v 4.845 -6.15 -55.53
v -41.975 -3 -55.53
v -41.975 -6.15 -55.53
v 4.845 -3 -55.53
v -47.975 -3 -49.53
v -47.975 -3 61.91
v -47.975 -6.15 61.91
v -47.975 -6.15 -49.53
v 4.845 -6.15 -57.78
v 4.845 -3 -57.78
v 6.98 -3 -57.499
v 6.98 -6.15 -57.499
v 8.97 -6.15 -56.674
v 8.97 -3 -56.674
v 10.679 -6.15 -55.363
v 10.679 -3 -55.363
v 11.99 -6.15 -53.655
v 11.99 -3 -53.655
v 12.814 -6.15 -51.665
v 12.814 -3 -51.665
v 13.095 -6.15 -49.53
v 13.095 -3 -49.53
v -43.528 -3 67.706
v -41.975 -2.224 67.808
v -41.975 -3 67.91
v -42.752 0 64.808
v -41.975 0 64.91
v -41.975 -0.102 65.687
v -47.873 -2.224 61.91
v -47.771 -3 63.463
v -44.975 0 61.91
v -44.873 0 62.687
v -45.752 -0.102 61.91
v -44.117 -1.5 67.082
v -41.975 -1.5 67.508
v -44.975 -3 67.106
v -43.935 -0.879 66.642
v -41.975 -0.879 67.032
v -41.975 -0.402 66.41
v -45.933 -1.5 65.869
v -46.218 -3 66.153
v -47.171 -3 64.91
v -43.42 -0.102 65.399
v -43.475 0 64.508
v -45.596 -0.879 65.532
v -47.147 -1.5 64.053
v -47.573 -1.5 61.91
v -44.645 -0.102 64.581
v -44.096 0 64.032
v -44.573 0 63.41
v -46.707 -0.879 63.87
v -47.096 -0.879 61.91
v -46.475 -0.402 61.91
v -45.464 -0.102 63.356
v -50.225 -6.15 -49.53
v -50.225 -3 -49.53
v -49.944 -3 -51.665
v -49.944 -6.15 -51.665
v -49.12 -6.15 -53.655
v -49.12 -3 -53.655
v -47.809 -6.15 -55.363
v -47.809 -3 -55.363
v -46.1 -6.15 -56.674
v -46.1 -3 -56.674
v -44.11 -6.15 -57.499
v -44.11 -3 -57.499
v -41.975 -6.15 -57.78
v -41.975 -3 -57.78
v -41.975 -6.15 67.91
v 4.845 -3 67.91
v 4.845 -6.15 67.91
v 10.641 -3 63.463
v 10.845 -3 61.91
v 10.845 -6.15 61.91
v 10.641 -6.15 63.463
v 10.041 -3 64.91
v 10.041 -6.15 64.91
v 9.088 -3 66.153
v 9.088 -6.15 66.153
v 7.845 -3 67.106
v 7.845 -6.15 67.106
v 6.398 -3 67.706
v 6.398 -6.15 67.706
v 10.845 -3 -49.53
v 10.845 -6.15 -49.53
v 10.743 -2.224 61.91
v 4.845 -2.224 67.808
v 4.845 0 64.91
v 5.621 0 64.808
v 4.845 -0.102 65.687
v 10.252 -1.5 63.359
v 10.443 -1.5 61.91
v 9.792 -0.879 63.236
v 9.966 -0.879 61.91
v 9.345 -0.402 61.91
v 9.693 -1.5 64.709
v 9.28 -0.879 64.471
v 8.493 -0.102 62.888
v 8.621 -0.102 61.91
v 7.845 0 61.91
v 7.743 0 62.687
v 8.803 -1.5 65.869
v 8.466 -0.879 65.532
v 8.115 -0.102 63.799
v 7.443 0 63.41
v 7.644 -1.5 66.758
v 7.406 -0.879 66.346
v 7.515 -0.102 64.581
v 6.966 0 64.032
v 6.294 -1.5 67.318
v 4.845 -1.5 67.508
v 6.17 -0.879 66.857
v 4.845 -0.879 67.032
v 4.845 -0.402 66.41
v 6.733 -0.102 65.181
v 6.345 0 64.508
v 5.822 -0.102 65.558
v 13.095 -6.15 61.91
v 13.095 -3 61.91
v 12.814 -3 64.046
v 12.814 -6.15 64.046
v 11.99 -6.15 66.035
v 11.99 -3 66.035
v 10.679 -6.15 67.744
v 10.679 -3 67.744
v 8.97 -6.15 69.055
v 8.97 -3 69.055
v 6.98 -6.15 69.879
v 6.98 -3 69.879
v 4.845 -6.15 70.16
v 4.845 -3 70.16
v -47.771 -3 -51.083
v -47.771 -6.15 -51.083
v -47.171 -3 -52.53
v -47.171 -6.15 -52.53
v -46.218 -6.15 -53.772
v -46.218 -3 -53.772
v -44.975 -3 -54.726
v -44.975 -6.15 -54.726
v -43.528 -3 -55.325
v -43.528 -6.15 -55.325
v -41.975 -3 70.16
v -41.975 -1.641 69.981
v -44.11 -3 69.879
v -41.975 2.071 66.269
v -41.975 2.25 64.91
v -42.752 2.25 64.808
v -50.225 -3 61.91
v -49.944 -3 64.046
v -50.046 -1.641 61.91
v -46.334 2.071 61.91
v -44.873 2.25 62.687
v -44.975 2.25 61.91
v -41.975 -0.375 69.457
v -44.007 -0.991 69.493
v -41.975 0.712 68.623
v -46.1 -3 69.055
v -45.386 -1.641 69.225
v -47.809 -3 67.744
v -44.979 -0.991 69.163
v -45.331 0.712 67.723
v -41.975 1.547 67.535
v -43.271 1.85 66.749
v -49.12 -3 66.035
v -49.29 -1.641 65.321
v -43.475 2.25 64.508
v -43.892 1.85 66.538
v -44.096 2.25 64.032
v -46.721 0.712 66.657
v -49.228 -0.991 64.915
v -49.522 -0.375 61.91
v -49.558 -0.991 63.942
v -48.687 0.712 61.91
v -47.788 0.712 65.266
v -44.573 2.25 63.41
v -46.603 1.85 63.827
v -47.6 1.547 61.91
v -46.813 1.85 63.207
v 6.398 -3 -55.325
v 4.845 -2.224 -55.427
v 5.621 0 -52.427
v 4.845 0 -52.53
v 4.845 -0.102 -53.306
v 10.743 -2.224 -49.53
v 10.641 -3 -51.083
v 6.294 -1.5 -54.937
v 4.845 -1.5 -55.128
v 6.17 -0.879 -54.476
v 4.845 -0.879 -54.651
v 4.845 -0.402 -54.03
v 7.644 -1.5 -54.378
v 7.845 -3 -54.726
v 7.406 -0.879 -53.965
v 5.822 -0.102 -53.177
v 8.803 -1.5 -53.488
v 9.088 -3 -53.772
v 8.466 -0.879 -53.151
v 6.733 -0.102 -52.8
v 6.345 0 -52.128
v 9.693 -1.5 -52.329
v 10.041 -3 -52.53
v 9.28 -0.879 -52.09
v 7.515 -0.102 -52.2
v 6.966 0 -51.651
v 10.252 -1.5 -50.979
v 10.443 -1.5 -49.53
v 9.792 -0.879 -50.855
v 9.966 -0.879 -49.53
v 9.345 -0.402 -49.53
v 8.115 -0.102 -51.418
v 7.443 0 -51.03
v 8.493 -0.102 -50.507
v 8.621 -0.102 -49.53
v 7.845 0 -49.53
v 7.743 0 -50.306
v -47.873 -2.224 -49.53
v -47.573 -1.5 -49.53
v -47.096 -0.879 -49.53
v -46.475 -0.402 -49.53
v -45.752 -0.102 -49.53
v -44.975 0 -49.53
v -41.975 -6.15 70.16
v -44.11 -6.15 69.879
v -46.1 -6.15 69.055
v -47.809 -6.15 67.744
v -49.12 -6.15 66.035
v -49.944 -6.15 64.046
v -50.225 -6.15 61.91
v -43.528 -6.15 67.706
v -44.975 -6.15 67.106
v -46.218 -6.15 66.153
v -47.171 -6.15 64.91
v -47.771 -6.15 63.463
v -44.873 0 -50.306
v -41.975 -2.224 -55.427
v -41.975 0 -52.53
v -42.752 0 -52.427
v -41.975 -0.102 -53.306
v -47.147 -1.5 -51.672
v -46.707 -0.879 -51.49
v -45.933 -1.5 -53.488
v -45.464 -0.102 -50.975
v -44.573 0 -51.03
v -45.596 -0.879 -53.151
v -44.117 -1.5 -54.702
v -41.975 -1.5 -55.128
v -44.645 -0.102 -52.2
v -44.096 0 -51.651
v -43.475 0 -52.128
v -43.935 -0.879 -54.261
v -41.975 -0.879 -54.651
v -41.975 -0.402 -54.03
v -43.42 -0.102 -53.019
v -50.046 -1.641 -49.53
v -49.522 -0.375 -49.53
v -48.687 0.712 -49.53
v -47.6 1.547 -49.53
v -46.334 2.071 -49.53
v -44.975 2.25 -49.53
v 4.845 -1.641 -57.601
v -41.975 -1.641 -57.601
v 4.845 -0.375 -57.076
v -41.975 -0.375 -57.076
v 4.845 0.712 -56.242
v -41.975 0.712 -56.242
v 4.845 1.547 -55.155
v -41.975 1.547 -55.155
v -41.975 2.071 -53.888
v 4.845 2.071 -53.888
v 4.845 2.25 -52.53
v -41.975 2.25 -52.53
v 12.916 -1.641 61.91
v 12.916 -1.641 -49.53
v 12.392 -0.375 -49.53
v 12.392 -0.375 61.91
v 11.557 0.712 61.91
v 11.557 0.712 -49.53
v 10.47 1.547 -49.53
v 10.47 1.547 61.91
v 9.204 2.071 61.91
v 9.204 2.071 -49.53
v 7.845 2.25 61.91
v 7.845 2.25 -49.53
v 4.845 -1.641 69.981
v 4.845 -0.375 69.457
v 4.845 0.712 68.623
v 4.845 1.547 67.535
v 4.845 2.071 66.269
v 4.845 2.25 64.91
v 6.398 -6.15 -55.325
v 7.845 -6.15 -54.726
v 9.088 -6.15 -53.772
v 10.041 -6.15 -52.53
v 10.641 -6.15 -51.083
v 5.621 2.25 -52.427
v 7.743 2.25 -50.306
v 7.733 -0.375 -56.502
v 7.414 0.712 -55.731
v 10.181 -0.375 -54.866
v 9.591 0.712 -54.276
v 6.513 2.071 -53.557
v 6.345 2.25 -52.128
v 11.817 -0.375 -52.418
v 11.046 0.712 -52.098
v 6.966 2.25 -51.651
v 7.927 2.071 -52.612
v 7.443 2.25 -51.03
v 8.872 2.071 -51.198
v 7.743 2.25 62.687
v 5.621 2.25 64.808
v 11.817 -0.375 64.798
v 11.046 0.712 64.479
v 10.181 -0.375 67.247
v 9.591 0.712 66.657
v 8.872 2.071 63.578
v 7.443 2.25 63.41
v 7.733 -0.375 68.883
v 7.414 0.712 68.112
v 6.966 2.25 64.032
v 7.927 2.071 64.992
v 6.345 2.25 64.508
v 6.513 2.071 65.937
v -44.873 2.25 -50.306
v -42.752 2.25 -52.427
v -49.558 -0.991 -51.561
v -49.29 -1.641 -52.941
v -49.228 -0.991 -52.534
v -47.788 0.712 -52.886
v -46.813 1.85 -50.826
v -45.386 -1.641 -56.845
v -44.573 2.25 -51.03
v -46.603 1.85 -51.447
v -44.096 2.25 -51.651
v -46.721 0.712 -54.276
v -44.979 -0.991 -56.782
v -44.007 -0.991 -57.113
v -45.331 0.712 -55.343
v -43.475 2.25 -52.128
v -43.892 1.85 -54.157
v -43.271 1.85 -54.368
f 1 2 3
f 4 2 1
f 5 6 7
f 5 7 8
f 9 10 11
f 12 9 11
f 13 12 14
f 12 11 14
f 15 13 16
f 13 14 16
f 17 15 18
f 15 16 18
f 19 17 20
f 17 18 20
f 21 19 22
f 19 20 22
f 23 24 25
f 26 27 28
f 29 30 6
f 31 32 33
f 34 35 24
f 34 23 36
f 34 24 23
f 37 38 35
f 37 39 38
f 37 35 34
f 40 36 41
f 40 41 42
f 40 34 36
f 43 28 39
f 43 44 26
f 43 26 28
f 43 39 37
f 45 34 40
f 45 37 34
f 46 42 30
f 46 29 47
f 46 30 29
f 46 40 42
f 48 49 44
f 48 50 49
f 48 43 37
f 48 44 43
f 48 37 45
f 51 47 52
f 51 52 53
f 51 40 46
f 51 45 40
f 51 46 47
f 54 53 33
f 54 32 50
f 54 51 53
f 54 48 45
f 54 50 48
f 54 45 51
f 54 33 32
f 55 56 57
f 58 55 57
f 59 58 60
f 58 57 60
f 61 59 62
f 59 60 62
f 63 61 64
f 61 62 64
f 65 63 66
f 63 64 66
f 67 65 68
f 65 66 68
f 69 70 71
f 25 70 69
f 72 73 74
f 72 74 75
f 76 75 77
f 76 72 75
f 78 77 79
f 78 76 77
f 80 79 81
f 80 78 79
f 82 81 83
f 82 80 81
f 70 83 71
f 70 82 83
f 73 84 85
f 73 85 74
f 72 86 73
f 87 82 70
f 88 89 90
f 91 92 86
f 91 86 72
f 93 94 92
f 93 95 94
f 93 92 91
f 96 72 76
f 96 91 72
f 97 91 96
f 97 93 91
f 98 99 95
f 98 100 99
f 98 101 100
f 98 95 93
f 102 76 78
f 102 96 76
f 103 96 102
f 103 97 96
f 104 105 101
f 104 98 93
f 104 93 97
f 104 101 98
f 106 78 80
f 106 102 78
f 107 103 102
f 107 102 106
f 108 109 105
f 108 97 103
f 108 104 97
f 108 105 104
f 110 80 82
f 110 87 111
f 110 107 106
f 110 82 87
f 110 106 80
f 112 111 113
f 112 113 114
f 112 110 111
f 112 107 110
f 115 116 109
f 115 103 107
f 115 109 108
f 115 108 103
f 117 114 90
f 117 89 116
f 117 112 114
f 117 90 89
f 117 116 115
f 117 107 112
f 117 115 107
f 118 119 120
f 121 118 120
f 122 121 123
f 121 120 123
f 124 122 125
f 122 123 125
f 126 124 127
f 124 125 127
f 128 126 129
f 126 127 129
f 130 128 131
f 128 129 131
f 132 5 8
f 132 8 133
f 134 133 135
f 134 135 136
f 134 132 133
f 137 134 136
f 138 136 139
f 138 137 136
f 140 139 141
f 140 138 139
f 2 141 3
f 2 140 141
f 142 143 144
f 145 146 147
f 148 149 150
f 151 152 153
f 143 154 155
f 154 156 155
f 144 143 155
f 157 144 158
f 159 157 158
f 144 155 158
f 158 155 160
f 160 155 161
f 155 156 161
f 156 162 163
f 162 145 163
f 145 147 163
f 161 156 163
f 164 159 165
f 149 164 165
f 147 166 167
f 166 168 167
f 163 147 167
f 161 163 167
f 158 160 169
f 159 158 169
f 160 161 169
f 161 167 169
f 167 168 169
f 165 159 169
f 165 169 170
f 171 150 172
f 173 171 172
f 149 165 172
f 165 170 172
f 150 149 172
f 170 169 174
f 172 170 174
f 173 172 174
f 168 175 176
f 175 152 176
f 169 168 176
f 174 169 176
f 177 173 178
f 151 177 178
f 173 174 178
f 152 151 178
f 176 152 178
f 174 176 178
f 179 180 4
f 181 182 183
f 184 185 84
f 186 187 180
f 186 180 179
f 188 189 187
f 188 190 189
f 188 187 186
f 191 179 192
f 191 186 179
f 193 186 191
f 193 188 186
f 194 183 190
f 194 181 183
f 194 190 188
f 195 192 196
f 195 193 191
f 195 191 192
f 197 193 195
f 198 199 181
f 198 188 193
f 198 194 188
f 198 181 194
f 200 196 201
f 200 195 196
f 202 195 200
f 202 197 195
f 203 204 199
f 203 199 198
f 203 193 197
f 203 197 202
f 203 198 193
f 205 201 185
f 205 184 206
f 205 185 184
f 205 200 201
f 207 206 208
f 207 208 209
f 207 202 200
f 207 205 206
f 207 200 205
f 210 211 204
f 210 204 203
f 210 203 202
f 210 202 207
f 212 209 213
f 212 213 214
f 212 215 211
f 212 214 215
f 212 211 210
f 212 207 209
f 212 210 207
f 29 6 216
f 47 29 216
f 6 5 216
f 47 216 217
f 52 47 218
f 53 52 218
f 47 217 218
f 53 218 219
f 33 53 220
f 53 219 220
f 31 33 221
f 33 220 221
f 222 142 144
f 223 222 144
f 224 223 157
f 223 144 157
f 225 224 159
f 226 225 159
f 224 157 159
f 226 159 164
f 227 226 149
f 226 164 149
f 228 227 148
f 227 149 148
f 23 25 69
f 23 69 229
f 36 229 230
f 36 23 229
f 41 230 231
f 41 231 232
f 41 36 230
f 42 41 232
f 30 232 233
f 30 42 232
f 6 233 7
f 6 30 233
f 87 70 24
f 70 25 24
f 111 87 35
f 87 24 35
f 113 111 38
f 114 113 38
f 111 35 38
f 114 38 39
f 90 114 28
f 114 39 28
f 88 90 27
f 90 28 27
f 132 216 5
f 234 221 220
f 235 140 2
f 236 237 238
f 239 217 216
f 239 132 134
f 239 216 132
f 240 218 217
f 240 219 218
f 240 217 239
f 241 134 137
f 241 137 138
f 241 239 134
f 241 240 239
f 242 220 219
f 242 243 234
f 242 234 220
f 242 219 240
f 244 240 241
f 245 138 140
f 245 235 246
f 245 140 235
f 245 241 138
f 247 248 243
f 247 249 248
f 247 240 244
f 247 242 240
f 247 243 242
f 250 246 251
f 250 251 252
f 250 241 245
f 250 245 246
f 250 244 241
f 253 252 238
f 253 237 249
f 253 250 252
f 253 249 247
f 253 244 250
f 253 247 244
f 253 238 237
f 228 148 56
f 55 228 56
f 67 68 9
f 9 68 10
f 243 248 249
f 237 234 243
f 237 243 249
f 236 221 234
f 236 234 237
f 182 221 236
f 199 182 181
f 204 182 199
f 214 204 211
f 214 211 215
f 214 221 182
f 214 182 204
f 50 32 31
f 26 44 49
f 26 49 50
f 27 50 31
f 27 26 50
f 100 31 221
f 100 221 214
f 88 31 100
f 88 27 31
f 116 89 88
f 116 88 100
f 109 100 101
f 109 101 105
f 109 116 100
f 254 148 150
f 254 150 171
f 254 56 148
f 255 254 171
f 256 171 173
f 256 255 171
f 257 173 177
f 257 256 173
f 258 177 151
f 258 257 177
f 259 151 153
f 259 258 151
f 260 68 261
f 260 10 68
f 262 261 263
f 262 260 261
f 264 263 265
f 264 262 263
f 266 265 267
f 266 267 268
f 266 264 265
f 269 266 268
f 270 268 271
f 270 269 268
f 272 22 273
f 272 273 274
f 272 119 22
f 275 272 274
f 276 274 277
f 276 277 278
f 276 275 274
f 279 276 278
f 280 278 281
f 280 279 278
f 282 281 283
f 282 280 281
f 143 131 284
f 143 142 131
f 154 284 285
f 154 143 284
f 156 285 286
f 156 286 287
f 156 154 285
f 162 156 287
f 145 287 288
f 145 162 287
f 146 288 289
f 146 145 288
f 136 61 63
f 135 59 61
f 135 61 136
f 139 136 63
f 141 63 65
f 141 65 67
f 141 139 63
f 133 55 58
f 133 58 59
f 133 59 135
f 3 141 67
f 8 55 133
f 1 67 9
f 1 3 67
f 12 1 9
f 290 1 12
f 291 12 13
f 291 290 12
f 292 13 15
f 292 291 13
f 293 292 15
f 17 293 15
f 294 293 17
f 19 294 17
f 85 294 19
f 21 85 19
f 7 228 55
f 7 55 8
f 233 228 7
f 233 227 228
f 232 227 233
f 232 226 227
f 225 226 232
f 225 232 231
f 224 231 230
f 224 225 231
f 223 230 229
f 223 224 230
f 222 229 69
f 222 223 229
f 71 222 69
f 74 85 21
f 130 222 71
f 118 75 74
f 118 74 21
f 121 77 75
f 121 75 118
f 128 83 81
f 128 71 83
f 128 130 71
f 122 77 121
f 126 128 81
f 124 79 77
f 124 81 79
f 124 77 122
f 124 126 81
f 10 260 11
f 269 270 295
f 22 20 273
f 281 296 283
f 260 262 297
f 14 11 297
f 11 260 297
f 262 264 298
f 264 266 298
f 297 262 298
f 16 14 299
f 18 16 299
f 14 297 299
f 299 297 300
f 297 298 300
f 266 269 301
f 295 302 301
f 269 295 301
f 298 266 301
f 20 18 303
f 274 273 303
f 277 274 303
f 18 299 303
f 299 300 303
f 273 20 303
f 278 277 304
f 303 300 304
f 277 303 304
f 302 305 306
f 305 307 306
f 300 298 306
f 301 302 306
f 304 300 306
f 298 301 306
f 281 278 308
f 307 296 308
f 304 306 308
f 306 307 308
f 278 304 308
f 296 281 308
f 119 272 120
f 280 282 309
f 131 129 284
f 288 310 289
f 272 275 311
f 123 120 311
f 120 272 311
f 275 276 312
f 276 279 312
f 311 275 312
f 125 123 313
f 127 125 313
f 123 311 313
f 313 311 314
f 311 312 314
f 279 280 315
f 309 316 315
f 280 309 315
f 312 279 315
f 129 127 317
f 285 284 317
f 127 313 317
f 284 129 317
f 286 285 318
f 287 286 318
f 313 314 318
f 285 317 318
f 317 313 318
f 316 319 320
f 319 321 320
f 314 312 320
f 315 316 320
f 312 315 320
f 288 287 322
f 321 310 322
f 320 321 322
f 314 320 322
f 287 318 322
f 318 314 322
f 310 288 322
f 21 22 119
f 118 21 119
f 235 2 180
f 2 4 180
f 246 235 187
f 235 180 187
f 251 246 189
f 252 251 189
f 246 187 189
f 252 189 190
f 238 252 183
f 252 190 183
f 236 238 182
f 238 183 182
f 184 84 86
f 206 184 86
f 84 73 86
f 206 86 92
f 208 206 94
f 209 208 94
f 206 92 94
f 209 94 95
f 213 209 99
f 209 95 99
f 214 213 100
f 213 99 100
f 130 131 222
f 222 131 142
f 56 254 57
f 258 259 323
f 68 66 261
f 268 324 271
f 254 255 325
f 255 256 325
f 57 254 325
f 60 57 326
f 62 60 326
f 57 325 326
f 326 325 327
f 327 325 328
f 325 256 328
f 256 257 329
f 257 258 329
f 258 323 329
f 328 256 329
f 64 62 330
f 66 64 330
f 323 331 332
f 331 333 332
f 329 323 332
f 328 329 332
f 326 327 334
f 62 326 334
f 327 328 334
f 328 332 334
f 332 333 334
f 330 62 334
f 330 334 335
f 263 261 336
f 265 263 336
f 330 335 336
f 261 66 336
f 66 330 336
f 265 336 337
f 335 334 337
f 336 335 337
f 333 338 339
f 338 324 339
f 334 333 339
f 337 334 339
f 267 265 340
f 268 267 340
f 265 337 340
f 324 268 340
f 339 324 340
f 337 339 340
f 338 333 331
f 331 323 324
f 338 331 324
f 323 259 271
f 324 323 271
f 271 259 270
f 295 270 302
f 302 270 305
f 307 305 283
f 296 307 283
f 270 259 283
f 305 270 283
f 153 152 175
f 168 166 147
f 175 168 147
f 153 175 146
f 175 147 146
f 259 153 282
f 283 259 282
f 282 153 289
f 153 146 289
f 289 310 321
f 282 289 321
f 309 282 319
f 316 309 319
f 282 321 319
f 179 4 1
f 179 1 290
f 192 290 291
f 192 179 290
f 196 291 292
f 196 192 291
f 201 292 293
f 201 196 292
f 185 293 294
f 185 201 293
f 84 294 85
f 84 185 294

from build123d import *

# Parameters (mm, degrees)
F1_DEPTH = 6.15
F2_R     = 3
F3_T     = 2.25


with BuildPart() as f1:
    # F0 (on Front) → F1 (new body)
    with BuildSketch(Plane.XZ):
        with BuildLine():
            ThreePointArc((-41.975048, 67.910328), (-46.217689, 66.152969), (-47.975048, 61.910328))
            Line((-47.975048, 61.910328), (-47.975048, -49.529672))
            ThreePointArc((-47.975048, -49.529672), (-46.217689, -53.772313), (-41.975048, -55.529672))
            Line((-41.975048, -55.529672), (4.844952, -55.529672))
            ThreePointArc((4.844952, -55.529672), (9.087592, -53.772313), (10.844952, -49.529672))
            Line((10.844952, -49.529672), (10.844952, 61.910328))
            ThreePointArc((10.844952, 61.910328), (9.087592, 66.152969), (4.844952, 67.910328))
            Line((4.844952, 67.910328), (-41.975048, 67.910328))
        make_face()
    extrude(amount=F1_DEPTH)

    # F2
    f2_edges = [f1.edges().sort_by_distance(p)[0] for p in [
        (10.844952, 0, 6.190328),
    ]]
    fillet(f2_edges, radius=F2_R)

    # F3
    f3_openings = [f1.faces().sort_by_distance(p)[0] for p in [
        (-18.565048, -6.15, 6.190328),
    ]]
    offset(amount=F3_T, openings=f3_openings)


solid = f1.part
